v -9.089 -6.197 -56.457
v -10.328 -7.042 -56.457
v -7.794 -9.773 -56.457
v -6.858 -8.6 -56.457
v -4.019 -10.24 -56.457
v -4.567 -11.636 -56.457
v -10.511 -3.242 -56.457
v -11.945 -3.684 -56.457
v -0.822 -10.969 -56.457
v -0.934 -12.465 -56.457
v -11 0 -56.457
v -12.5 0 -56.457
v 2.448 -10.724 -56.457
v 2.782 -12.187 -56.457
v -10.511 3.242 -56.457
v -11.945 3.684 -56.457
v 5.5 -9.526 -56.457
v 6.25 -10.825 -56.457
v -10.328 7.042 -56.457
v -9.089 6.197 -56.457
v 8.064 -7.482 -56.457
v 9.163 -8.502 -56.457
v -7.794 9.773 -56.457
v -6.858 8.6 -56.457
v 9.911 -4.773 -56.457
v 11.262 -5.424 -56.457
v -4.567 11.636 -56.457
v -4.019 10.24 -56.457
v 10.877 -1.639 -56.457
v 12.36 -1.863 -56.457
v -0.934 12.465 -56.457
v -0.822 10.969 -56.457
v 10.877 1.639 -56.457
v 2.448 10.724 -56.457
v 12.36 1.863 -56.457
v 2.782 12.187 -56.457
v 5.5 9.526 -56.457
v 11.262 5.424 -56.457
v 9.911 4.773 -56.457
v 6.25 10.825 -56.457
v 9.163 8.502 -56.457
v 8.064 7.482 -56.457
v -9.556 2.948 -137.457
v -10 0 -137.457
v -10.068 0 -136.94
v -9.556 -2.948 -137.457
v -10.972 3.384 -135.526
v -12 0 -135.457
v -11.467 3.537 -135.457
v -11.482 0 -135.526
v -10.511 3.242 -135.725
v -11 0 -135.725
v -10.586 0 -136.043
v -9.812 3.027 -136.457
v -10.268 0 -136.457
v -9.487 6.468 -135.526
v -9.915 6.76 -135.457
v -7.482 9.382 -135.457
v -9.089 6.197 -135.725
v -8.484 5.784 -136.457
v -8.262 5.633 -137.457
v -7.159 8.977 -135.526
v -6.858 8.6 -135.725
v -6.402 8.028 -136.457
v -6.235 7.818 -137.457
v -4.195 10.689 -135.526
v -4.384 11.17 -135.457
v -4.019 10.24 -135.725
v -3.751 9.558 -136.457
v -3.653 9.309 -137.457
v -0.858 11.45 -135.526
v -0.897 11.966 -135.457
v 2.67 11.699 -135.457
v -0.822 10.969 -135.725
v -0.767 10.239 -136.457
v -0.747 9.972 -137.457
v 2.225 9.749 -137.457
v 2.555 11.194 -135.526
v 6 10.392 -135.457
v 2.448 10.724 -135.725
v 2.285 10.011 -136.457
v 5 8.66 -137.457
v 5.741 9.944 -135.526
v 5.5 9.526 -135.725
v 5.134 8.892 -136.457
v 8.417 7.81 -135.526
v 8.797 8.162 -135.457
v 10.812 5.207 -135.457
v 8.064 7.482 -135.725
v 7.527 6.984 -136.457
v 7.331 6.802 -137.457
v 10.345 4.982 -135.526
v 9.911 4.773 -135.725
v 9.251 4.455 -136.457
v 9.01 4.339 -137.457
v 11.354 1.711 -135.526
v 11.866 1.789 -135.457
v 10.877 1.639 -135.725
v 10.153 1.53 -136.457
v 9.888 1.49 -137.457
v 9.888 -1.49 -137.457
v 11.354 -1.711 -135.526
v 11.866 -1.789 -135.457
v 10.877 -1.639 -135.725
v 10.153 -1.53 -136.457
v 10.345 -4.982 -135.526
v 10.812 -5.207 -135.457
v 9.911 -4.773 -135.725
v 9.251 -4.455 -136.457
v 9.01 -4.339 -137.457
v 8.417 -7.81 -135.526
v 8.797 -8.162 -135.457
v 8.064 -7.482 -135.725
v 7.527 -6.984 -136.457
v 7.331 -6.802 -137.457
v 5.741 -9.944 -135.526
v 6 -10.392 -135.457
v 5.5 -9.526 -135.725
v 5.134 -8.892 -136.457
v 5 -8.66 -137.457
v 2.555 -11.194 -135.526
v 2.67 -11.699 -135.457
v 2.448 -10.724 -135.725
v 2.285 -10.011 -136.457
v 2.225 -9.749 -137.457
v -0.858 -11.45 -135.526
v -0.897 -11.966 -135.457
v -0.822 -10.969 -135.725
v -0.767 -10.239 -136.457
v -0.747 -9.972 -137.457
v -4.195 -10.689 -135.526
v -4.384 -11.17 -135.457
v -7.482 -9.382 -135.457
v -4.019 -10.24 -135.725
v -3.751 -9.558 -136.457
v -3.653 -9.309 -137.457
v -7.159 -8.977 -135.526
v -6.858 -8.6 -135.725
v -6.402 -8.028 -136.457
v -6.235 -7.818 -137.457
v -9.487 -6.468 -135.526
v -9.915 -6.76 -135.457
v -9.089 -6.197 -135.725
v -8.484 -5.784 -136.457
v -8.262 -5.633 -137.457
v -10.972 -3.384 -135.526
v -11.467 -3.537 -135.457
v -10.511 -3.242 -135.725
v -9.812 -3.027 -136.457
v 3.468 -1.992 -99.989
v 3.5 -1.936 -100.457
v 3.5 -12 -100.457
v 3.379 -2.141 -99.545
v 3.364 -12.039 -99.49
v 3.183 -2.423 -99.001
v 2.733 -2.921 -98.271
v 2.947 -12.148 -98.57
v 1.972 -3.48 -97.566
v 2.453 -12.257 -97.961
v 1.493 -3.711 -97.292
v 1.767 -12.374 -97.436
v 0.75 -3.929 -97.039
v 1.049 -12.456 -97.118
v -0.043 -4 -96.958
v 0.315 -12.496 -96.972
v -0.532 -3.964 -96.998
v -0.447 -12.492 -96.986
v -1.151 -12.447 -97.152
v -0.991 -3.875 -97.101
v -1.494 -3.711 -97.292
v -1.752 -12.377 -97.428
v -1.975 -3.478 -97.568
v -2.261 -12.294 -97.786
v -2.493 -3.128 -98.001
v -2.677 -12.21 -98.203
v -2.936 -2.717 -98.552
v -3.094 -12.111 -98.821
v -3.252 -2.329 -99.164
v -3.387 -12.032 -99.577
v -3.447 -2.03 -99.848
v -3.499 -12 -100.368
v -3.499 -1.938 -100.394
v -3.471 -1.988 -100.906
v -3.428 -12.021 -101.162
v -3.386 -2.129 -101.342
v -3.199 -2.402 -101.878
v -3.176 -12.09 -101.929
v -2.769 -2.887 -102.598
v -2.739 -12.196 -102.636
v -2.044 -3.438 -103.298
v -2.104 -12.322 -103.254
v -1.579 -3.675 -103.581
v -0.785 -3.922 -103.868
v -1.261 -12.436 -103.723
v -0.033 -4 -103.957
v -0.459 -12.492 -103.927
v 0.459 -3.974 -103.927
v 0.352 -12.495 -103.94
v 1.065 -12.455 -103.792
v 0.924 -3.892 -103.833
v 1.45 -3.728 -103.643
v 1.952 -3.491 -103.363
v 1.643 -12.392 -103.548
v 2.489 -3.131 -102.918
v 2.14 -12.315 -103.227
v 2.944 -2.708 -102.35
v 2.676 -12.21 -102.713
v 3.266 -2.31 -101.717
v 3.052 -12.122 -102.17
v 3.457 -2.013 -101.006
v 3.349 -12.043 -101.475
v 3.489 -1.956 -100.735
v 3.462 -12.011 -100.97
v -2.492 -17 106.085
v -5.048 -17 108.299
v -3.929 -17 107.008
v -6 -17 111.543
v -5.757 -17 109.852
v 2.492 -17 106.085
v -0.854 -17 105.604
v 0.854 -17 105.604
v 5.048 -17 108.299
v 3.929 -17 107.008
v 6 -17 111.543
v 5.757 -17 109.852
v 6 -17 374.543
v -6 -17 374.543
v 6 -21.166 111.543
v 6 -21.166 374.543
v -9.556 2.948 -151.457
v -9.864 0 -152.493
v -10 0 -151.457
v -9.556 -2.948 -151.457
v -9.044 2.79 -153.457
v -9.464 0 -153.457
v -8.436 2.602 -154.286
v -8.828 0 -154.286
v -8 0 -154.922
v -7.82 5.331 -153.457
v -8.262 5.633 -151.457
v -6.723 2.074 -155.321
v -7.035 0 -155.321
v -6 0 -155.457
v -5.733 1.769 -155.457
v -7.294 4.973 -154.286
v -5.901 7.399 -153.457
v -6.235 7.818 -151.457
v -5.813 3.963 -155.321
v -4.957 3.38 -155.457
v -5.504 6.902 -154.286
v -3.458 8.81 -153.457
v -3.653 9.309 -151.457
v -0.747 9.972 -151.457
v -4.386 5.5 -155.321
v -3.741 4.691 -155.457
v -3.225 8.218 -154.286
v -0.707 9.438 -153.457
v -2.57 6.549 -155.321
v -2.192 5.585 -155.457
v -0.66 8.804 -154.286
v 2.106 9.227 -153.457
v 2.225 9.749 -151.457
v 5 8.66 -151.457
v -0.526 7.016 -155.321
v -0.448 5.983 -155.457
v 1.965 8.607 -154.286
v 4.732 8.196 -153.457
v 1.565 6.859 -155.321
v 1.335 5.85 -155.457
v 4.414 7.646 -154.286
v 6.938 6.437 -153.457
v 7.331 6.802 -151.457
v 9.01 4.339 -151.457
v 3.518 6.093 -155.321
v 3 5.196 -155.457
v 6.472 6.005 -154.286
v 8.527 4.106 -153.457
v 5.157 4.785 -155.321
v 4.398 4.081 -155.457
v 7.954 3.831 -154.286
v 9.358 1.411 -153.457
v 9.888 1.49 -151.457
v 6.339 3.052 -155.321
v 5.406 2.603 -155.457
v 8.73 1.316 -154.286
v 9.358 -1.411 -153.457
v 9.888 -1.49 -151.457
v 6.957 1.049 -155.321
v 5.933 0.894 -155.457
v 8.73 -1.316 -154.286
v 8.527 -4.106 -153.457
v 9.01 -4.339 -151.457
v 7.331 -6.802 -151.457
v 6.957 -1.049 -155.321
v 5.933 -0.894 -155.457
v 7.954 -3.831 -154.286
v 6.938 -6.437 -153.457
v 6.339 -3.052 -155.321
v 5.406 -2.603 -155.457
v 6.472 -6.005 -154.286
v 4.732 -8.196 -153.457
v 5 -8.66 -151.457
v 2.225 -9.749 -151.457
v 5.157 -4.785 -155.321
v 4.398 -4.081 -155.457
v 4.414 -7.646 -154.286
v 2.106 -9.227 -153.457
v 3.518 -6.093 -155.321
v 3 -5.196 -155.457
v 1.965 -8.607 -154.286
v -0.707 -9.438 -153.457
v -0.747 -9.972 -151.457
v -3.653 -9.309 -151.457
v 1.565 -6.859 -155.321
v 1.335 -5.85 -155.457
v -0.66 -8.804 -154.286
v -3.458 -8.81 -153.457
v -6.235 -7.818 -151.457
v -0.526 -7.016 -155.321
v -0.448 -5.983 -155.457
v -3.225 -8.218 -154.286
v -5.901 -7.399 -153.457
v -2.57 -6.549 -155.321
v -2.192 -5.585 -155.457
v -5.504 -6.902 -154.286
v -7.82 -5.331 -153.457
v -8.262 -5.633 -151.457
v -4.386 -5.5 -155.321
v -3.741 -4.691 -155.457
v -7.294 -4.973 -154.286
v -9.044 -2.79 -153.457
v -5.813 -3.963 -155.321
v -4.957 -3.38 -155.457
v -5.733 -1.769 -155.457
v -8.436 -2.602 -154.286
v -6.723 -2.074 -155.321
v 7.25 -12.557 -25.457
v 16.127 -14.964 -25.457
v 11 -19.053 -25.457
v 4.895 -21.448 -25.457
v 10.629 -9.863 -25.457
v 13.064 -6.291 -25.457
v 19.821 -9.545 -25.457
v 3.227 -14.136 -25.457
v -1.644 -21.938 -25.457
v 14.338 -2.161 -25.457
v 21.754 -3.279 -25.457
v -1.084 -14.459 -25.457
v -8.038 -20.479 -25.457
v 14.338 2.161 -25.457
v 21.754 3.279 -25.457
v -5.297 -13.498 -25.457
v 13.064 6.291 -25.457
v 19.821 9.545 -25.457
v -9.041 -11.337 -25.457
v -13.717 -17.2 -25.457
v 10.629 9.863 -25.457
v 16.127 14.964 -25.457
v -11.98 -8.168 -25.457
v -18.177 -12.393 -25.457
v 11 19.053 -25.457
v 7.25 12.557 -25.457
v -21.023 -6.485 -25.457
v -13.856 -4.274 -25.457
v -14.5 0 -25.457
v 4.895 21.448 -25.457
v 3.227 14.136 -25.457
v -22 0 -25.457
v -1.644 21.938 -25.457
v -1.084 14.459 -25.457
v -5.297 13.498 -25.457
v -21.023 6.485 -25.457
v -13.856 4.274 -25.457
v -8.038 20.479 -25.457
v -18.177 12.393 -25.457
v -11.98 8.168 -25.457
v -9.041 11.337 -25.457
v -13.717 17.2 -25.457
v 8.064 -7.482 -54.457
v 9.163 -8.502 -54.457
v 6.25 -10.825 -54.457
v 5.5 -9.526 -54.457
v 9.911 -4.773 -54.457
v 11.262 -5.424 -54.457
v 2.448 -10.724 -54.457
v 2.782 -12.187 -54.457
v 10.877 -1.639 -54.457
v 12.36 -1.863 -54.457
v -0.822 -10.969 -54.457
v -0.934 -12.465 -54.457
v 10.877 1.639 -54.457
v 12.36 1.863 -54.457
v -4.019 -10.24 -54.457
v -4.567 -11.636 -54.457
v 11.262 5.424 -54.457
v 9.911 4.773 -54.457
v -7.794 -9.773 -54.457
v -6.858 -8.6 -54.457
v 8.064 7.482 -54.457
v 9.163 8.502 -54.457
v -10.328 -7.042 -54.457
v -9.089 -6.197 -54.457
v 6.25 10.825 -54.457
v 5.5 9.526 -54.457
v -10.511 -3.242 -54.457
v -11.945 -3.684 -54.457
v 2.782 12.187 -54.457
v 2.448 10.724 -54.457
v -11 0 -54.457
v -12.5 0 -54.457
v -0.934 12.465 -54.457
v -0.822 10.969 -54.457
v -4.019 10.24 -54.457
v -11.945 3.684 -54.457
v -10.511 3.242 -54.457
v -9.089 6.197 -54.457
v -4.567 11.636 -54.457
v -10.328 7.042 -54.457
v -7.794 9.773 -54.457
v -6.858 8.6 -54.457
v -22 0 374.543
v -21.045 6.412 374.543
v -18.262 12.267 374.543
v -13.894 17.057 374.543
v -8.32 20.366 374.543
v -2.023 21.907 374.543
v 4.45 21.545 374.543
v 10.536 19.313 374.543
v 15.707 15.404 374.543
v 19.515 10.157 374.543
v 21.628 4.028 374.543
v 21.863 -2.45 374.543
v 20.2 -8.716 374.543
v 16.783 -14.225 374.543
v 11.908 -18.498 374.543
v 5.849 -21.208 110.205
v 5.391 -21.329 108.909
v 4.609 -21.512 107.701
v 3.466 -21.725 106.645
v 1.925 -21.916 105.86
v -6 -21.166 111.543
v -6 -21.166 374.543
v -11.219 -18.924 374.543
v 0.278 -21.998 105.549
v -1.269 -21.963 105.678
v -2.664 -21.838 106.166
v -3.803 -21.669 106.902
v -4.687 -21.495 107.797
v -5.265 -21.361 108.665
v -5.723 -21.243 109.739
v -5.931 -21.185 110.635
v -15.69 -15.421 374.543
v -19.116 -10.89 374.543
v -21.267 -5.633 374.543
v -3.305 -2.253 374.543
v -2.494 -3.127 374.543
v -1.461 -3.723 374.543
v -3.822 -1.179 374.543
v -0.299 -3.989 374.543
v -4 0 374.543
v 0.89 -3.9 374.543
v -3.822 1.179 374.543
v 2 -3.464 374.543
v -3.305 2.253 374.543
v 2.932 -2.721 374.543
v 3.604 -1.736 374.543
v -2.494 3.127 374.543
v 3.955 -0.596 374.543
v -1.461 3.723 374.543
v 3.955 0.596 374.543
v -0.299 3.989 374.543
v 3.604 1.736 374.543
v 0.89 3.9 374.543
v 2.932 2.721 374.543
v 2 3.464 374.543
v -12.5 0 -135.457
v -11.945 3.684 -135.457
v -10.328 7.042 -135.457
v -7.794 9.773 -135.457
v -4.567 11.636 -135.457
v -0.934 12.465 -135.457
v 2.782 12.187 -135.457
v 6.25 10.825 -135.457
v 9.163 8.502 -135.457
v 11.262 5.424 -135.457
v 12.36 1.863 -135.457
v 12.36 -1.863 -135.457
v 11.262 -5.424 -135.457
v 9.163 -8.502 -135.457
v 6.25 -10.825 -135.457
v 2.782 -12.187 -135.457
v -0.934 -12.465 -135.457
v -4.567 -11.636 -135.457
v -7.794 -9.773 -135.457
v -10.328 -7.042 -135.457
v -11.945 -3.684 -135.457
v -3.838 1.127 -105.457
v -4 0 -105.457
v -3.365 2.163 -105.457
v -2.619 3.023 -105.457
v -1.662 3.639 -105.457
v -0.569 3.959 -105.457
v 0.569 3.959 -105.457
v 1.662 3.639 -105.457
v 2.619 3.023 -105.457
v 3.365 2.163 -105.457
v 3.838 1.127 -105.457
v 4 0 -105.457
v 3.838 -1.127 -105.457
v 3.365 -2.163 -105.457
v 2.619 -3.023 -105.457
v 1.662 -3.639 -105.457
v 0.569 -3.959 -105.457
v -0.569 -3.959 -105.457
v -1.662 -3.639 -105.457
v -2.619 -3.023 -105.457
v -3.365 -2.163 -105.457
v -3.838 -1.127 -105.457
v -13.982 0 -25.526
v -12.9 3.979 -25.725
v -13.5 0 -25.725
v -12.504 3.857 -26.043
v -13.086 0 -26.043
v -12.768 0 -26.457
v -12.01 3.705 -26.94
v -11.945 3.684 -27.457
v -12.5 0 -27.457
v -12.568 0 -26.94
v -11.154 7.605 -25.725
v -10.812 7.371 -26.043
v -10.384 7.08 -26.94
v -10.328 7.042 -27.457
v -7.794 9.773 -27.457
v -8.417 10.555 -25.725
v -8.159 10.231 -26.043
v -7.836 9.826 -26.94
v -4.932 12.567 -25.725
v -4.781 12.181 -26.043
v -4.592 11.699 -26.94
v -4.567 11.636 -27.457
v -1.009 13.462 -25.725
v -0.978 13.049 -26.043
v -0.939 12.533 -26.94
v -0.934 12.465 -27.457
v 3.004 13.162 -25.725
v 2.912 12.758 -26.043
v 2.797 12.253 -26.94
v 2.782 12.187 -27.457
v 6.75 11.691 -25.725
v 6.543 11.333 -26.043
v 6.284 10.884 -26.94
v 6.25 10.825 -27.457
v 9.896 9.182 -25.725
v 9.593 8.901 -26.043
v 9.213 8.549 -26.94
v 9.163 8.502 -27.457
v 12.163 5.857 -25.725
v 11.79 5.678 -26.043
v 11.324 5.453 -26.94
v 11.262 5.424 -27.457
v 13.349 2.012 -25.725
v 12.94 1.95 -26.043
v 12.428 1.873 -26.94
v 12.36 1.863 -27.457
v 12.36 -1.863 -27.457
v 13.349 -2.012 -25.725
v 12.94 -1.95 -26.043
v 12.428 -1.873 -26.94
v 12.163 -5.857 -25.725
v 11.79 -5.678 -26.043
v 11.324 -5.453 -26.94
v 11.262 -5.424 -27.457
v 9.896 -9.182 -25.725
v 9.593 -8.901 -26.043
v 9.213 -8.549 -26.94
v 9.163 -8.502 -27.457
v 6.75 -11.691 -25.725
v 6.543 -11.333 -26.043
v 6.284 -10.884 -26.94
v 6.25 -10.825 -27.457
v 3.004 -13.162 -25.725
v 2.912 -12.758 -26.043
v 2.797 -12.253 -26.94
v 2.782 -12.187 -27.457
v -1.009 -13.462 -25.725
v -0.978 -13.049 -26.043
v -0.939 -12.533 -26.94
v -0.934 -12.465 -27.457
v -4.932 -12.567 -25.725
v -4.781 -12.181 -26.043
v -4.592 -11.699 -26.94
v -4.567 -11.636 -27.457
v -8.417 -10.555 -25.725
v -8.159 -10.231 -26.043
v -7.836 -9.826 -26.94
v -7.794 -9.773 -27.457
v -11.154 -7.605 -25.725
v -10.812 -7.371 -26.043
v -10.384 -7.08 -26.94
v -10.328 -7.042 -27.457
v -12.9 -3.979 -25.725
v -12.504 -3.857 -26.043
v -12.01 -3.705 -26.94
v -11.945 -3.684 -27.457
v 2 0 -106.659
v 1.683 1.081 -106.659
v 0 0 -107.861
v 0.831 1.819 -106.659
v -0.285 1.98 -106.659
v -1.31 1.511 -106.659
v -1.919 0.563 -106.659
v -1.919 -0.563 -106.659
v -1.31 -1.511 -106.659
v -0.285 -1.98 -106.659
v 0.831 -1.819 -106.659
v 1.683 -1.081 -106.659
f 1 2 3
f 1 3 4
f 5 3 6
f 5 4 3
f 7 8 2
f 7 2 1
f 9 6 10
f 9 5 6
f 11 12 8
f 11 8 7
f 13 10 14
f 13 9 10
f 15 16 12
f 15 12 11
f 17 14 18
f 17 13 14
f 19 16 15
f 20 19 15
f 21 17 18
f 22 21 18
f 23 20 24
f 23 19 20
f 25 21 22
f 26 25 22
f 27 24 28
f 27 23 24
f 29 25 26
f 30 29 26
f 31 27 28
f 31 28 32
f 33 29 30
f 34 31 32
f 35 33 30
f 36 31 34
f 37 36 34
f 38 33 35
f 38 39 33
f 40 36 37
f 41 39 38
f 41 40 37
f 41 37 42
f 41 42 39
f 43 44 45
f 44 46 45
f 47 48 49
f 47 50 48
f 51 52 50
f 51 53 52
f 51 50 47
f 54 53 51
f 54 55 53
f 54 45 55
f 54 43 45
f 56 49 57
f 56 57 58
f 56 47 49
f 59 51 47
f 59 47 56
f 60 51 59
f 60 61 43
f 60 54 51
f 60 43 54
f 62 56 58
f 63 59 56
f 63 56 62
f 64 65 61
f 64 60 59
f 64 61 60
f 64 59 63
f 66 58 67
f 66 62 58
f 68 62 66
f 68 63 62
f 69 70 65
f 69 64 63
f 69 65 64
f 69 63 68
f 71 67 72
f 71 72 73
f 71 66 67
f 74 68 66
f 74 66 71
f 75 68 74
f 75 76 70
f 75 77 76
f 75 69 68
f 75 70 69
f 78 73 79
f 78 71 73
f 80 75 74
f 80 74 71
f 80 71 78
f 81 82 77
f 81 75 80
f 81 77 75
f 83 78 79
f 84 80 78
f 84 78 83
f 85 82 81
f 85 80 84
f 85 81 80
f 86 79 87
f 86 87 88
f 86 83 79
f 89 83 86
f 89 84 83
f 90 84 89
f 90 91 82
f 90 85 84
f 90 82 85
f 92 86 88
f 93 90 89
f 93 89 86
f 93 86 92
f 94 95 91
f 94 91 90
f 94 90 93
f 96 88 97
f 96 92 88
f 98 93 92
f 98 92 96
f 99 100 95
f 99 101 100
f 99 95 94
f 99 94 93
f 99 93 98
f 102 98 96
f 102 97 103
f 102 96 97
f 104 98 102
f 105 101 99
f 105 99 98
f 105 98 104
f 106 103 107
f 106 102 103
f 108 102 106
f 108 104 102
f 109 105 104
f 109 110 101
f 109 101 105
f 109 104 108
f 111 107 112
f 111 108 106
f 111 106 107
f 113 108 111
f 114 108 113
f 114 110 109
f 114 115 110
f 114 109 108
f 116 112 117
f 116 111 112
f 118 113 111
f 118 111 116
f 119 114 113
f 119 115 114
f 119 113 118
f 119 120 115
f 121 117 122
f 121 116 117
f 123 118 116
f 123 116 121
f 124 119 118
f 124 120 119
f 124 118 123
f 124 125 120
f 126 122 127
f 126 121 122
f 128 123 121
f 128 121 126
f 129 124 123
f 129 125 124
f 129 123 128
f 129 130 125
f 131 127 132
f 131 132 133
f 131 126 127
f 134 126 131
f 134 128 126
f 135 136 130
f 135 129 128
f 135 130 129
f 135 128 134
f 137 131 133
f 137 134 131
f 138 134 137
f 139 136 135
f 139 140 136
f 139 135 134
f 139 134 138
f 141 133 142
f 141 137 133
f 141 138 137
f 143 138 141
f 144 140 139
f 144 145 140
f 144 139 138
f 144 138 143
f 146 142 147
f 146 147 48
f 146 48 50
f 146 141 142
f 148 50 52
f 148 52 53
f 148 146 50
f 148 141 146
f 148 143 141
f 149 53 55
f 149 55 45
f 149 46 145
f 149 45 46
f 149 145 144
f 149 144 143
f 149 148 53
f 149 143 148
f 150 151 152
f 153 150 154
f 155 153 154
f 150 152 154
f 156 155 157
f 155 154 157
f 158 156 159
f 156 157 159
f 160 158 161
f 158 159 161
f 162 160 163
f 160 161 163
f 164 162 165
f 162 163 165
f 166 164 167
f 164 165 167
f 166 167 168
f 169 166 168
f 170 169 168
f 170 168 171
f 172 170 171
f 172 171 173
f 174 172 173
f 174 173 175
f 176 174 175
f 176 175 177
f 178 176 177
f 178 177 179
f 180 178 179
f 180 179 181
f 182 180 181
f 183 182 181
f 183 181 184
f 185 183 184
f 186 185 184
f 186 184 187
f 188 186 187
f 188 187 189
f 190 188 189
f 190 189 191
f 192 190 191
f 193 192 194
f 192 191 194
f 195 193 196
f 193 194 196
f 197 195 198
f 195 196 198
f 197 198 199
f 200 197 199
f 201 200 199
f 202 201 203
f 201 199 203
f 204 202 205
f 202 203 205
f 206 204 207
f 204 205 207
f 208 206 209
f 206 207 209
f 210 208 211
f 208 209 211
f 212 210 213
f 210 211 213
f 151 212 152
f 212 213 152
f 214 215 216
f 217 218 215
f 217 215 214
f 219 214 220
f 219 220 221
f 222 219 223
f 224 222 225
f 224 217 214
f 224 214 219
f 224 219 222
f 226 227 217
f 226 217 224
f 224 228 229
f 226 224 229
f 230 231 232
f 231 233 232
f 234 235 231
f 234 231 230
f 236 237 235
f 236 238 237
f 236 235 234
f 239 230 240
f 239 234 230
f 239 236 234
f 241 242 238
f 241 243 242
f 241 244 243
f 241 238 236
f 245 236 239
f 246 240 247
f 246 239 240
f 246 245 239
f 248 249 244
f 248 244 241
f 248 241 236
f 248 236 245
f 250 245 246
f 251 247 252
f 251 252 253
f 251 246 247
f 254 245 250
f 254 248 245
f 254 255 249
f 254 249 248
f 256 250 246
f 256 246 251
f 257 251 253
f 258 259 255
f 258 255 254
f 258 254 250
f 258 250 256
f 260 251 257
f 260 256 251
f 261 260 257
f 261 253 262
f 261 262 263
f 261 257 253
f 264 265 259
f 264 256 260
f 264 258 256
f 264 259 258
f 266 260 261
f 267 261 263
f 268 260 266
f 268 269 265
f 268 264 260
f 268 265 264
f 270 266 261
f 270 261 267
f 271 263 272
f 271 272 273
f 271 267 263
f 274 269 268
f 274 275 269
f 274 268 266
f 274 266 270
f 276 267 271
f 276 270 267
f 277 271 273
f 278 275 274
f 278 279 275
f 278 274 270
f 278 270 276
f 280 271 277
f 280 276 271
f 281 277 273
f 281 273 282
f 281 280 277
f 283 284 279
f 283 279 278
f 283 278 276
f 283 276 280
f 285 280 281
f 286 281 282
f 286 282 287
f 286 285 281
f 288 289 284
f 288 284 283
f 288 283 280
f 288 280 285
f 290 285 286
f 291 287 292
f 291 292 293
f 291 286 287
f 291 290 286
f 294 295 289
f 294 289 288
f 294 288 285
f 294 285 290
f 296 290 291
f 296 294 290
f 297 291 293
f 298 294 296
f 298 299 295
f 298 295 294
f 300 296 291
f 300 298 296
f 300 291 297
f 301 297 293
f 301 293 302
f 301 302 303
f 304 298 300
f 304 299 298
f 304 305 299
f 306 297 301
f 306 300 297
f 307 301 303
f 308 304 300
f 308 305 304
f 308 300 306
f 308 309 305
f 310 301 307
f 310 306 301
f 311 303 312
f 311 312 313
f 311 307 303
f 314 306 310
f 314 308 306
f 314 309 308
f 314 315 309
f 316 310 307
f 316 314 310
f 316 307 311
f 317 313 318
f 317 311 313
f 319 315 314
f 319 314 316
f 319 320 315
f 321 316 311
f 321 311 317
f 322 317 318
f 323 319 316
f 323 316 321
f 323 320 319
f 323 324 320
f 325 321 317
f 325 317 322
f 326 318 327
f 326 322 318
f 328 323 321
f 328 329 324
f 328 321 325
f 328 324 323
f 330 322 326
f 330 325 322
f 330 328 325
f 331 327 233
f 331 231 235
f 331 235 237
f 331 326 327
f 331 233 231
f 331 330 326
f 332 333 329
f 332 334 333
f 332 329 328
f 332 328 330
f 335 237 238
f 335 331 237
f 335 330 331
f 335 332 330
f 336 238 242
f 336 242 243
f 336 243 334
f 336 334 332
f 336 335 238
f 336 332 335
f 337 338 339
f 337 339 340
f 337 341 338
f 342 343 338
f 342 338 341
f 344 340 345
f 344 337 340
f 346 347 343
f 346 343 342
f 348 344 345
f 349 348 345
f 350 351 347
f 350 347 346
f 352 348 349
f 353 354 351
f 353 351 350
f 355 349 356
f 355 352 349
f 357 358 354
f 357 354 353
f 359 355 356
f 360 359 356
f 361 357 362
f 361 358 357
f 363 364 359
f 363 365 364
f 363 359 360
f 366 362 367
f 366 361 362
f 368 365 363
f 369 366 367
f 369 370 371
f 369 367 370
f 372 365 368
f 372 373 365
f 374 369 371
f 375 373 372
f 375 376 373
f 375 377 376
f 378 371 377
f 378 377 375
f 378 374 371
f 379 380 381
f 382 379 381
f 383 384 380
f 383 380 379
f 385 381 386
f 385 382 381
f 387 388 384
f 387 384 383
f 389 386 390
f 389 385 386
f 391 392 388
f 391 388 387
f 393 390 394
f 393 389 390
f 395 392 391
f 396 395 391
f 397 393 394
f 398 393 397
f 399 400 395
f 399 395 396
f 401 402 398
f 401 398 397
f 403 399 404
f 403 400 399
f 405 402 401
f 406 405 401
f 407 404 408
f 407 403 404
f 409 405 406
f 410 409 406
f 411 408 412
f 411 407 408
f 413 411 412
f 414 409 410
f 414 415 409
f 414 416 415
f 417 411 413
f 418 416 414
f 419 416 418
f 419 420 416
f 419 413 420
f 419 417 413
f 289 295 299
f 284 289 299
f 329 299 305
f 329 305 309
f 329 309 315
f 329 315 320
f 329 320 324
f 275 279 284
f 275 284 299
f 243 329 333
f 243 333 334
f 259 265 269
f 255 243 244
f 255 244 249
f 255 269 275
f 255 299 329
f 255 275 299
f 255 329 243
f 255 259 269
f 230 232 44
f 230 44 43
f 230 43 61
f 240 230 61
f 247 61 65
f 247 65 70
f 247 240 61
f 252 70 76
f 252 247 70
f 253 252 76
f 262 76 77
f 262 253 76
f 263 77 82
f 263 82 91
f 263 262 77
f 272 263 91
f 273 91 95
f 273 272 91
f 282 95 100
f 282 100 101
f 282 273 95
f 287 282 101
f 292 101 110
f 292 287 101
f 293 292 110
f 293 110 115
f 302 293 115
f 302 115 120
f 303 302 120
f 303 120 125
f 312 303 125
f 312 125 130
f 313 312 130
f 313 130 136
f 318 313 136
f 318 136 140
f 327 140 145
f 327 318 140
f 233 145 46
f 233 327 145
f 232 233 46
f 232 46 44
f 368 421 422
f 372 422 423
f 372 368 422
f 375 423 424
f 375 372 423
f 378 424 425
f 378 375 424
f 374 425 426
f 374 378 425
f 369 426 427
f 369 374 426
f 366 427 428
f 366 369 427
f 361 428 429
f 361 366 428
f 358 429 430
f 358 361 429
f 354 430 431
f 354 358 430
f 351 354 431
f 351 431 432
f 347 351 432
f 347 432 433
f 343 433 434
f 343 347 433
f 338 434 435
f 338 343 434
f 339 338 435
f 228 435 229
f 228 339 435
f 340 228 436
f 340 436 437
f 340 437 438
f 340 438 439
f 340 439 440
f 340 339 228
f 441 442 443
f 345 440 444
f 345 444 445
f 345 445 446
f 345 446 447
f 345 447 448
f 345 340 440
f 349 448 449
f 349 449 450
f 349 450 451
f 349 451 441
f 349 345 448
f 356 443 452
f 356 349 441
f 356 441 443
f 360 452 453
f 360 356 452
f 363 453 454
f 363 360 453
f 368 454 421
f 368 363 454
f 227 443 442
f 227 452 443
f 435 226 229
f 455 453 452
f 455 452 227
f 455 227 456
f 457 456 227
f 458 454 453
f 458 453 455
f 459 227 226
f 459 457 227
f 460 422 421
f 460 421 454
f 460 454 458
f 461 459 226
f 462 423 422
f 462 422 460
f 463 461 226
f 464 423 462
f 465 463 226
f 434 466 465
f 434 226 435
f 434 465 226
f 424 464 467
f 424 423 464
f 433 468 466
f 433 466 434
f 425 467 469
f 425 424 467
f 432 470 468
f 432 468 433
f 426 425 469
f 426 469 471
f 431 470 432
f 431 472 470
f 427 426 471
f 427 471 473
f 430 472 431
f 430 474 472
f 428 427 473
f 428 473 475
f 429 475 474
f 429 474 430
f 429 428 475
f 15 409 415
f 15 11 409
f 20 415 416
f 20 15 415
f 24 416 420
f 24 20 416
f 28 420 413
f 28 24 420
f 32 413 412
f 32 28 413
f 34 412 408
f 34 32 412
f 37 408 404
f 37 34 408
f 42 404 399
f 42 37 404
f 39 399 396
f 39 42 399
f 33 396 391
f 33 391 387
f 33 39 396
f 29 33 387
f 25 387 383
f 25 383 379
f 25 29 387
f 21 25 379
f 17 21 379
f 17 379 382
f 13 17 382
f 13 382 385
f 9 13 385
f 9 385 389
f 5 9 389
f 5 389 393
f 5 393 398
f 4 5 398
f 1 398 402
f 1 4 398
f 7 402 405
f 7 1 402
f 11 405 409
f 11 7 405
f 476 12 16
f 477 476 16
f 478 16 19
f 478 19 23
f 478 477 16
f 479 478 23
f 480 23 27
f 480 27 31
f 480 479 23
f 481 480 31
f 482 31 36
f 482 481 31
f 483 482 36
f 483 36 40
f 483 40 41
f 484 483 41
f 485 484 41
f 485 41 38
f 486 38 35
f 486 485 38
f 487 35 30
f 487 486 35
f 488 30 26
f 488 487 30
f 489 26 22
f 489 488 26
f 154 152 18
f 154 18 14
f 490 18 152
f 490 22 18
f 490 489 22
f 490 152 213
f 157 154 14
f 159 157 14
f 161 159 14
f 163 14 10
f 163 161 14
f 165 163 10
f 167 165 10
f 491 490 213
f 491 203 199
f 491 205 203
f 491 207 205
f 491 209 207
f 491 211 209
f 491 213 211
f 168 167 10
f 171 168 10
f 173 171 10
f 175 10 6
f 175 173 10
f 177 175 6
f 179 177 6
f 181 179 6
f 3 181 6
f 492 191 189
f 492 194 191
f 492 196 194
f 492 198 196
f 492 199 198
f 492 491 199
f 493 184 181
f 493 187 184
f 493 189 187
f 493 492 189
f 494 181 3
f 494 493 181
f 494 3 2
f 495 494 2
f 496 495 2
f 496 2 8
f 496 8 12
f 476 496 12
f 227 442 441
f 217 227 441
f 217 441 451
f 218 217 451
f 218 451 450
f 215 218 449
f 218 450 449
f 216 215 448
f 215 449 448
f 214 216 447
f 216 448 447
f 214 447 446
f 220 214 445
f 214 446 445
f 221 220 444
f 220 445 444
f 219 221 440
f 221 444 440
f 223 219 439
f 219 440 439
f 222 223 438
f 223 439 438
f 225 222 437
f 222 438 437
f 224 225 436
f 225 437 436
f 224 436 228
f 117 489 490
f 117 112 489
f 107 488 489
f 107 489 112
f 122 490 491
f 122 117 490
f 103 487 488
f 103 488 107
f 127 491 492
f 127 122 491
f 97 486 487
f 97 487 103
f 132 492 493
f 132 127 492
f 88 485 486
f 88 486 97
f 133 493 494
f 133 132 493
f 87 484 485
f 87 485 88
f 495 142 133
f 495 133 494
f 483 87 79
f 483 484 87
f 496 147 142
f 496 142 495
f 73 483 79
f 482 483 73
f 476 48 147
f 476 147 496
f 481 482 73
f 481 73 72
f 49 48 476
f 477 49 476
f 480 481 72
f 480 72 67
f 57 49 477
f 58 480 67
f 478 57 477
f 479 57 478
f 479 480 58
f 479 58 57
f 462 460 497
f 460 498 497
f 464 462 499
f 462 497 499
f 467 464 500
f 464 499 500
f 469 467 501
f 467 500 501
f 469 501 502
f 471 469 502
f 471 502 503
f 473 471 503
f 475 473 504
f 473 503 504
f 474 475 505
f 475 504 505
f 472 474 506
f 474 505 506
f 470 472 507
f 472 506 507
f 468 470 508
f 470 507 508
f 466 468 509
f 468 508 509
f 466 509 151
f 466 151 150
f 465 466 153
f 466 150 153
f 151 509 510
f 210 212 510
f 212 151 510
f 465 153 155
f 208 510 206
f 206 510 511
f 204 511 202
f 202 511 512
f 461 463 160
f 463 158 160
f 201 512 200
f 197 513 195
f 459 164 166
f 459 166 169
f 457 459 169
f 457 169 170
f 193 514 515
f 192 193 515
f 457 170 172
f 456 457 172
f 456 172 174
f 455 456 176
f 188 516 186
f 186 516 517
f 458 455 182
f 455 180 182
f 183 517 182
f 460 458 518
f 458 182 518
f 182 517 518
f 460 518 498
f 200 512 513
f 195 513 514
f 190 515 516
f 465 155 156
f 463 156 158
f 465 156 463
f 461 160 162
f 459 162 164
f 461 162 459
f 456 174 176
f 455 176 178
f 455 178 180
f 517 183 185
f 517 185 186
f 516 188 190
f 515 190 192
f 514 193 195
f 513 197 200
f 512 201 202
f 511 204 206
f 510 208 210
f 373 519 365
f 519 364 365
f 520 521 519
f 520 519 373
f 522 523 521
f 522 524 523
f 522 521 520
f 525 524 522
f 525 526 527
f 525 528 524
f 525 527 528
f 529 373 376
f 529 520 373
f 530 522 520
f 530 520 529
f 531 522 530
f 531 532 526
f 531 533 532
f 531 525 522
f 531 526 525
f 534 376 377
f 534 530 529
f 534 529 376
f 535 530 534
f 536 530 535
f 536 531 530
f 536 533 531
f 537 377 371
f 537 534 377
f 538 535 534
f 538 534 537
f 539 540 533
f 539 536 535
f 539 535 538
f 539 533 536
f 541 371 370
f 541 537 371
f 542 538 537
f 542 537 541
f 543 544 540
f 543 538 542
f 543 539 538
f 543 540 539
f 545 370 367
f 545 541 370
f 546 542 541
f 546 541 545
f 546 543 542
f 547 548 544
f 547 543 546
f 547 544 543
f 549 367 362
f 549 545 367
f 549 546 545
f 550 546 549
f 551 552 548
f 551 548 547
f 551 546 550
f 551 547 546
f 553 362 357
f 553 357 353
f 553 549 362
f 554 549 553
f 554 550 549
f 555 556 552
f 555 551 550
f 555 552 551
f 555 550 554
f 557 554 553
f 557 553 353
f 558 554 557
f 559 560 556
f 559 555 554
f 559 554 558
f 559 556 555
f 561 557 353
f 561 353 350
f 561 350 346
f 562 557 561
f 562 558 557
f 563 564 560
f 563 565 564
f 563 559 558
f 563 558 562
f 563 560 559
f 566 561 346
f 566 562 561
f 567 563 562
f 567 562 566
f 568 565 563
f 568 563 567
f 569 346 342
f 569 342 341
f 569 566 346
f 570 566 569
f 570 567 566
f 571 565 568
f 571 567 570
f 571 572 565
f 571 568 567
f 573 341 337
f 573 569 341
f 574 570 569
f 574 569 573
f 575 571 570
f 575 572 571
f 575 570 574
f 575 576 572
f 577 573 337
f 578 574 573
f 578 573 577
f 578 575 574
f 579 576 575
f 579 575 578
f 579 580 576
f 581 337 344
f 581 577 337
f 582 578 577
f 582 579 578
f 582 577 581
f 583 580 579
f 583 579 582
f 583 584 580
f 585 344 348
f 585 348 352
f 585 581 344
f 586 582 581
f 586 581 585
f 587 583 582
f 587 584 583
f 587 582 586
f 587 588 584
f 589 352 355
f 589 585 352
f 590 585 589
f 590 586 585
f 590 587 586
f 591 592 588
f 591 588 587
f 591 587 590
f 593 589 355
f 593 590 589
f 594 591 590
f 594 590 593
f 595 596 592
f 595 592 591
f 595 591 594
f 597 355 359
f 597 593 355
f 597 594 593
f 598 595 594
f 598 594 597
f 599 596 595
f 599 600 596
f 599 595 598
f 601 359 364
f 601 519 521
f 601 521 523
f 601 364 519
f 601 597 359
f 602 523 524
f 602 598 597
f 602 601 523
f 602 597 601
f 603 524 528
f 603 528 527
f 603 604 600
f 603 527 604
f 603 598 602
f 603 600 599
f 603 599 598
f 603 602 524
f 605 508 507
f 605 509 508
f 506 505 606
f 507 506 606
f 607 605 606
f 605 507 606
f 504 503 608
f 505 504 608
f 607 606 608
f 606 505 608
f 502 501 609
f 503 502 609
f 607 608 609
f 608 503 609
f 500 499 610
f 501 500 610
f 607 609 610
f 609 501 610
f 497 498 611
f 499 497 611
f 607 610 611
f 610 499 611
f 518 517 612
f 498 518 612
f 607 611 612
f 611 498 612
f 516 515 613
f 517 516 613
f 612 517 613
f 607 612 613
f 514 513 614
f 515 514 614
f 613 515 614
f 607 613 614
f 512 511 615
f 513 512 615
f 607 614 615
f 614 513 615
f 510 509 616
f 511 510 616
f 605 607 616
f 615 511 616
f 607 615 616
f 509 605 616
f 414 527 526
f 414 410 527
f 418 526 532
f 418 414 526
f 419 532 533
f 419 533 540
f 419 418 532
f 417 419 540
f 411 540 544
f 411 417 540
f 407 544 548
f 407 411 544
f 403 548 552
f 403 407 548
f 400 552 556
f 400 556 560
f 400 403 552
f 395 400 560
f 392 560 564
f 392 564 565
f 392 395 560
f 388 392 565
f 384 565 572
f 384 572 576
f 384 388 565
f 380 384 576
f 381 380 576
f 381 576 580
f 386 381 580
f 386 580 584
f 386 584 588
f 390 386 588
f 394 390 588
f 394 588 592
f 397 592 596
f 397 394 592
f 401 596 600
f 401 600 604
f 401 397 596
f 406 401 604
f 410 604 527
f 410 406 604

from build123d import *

# Parameters (mm, degrees)
F5_DEPTH  = 5
F6_R      = 4
F7_R      = 3.5
F8_DEPTH  = 22
F10_D     = 8
F10_DEPTH = 480
F10_TIP   = 2.4034424761


with BuildPart() as f1:
    # F0 (on Front) → F1 (revolve)
    with BuildSketch(Plane.XZ):
        with BuildLine():
            Line((0, -155.457497781), (0, 374.542502219))
            Line((0, 374.542502219), (-22, 374.542502219))
            Line((-22, 374.542502219), (-22, -25.457497781))
            Line((-22, -25.457497781), (-14.5, -25.457497781))
            ThreePointArc((-14.5, -25.457497781), (-13.0857864376, -26.0432842186), (-12.5, -27.457497781))
            Line((-12.5, -27.457497781), (-12.5, -54.457497781))
            Line((-12.5, -54.457497781), (-11, -54.457497781))
            Line((-11, -54.457497781), (-11, -56.457497781))
            Line((-11, -56.457497781), (-12.5, -56.457497781))
            Line((-12.5, -56.457497781), (-12.5, -135.457497781))
            Line((-12.5, -135.457497781), (-12, -135.457497781))
            ThreePointArc((-12, -135.457497781), (-10.5857864376, -136.0432842186), (-10, -137.457497781))
            Line((-10, -137.457497781), (-10, -155.457497781))
            Line((-10, -155.457497781), (0, -155.457497781))
        make_face()
    revolve(axis=Axis((0, 0, 132.3210597038), (0, 0, -1)))

    # F4 (on offset) → F5 (cut)
    with BuildSketch(Plane.XZ.offset(22)):
        with BuildLine():
            Line((6, 111.542502219), (6, 643.542502219))
            Line((6, 643.542502219), (-6, 643.542502219))
            Line((-6, 643.542502219), (-6, 111.542502219))
            ThreePointArc((-6, 111.542502219), (0, 105.542502219), (6, 111.542502219))
        make_face()
    extrude(amount=-F5_DEPTH, mode=Mode.SUBTRACT)

    # F6
    f6_edges = [f1.edges().sort_by_distance(p)[0] for p in [
        (10, 0, -155.457498),
    ]]
    fillet(f6_edges, radius=F6_R)

    # F7 (on offset) → F8 (cut)
    with BuildSketch(Plane.XZ.offset(22)):
        with Locations((0, -100.457497781)):
            Circle(F7_R)
    extrude(amount=-F8_DEPTH, mode=Mode.SUBTRACT)

    # F10
    with Locations(Plane.XY.offset(374.542502219)):
        with Locations((0, 0)):
            Hole(F10_D / 2, depth=F10_DEPTH)
            with Locations((0, 0, -(F10_DEPTH + F10_TIP / 2))):  # 118° drill point
                Cone(0, F10_D / 2, F10_TIP, mode=Mode.SUBTRACT)


solid = f1.part
